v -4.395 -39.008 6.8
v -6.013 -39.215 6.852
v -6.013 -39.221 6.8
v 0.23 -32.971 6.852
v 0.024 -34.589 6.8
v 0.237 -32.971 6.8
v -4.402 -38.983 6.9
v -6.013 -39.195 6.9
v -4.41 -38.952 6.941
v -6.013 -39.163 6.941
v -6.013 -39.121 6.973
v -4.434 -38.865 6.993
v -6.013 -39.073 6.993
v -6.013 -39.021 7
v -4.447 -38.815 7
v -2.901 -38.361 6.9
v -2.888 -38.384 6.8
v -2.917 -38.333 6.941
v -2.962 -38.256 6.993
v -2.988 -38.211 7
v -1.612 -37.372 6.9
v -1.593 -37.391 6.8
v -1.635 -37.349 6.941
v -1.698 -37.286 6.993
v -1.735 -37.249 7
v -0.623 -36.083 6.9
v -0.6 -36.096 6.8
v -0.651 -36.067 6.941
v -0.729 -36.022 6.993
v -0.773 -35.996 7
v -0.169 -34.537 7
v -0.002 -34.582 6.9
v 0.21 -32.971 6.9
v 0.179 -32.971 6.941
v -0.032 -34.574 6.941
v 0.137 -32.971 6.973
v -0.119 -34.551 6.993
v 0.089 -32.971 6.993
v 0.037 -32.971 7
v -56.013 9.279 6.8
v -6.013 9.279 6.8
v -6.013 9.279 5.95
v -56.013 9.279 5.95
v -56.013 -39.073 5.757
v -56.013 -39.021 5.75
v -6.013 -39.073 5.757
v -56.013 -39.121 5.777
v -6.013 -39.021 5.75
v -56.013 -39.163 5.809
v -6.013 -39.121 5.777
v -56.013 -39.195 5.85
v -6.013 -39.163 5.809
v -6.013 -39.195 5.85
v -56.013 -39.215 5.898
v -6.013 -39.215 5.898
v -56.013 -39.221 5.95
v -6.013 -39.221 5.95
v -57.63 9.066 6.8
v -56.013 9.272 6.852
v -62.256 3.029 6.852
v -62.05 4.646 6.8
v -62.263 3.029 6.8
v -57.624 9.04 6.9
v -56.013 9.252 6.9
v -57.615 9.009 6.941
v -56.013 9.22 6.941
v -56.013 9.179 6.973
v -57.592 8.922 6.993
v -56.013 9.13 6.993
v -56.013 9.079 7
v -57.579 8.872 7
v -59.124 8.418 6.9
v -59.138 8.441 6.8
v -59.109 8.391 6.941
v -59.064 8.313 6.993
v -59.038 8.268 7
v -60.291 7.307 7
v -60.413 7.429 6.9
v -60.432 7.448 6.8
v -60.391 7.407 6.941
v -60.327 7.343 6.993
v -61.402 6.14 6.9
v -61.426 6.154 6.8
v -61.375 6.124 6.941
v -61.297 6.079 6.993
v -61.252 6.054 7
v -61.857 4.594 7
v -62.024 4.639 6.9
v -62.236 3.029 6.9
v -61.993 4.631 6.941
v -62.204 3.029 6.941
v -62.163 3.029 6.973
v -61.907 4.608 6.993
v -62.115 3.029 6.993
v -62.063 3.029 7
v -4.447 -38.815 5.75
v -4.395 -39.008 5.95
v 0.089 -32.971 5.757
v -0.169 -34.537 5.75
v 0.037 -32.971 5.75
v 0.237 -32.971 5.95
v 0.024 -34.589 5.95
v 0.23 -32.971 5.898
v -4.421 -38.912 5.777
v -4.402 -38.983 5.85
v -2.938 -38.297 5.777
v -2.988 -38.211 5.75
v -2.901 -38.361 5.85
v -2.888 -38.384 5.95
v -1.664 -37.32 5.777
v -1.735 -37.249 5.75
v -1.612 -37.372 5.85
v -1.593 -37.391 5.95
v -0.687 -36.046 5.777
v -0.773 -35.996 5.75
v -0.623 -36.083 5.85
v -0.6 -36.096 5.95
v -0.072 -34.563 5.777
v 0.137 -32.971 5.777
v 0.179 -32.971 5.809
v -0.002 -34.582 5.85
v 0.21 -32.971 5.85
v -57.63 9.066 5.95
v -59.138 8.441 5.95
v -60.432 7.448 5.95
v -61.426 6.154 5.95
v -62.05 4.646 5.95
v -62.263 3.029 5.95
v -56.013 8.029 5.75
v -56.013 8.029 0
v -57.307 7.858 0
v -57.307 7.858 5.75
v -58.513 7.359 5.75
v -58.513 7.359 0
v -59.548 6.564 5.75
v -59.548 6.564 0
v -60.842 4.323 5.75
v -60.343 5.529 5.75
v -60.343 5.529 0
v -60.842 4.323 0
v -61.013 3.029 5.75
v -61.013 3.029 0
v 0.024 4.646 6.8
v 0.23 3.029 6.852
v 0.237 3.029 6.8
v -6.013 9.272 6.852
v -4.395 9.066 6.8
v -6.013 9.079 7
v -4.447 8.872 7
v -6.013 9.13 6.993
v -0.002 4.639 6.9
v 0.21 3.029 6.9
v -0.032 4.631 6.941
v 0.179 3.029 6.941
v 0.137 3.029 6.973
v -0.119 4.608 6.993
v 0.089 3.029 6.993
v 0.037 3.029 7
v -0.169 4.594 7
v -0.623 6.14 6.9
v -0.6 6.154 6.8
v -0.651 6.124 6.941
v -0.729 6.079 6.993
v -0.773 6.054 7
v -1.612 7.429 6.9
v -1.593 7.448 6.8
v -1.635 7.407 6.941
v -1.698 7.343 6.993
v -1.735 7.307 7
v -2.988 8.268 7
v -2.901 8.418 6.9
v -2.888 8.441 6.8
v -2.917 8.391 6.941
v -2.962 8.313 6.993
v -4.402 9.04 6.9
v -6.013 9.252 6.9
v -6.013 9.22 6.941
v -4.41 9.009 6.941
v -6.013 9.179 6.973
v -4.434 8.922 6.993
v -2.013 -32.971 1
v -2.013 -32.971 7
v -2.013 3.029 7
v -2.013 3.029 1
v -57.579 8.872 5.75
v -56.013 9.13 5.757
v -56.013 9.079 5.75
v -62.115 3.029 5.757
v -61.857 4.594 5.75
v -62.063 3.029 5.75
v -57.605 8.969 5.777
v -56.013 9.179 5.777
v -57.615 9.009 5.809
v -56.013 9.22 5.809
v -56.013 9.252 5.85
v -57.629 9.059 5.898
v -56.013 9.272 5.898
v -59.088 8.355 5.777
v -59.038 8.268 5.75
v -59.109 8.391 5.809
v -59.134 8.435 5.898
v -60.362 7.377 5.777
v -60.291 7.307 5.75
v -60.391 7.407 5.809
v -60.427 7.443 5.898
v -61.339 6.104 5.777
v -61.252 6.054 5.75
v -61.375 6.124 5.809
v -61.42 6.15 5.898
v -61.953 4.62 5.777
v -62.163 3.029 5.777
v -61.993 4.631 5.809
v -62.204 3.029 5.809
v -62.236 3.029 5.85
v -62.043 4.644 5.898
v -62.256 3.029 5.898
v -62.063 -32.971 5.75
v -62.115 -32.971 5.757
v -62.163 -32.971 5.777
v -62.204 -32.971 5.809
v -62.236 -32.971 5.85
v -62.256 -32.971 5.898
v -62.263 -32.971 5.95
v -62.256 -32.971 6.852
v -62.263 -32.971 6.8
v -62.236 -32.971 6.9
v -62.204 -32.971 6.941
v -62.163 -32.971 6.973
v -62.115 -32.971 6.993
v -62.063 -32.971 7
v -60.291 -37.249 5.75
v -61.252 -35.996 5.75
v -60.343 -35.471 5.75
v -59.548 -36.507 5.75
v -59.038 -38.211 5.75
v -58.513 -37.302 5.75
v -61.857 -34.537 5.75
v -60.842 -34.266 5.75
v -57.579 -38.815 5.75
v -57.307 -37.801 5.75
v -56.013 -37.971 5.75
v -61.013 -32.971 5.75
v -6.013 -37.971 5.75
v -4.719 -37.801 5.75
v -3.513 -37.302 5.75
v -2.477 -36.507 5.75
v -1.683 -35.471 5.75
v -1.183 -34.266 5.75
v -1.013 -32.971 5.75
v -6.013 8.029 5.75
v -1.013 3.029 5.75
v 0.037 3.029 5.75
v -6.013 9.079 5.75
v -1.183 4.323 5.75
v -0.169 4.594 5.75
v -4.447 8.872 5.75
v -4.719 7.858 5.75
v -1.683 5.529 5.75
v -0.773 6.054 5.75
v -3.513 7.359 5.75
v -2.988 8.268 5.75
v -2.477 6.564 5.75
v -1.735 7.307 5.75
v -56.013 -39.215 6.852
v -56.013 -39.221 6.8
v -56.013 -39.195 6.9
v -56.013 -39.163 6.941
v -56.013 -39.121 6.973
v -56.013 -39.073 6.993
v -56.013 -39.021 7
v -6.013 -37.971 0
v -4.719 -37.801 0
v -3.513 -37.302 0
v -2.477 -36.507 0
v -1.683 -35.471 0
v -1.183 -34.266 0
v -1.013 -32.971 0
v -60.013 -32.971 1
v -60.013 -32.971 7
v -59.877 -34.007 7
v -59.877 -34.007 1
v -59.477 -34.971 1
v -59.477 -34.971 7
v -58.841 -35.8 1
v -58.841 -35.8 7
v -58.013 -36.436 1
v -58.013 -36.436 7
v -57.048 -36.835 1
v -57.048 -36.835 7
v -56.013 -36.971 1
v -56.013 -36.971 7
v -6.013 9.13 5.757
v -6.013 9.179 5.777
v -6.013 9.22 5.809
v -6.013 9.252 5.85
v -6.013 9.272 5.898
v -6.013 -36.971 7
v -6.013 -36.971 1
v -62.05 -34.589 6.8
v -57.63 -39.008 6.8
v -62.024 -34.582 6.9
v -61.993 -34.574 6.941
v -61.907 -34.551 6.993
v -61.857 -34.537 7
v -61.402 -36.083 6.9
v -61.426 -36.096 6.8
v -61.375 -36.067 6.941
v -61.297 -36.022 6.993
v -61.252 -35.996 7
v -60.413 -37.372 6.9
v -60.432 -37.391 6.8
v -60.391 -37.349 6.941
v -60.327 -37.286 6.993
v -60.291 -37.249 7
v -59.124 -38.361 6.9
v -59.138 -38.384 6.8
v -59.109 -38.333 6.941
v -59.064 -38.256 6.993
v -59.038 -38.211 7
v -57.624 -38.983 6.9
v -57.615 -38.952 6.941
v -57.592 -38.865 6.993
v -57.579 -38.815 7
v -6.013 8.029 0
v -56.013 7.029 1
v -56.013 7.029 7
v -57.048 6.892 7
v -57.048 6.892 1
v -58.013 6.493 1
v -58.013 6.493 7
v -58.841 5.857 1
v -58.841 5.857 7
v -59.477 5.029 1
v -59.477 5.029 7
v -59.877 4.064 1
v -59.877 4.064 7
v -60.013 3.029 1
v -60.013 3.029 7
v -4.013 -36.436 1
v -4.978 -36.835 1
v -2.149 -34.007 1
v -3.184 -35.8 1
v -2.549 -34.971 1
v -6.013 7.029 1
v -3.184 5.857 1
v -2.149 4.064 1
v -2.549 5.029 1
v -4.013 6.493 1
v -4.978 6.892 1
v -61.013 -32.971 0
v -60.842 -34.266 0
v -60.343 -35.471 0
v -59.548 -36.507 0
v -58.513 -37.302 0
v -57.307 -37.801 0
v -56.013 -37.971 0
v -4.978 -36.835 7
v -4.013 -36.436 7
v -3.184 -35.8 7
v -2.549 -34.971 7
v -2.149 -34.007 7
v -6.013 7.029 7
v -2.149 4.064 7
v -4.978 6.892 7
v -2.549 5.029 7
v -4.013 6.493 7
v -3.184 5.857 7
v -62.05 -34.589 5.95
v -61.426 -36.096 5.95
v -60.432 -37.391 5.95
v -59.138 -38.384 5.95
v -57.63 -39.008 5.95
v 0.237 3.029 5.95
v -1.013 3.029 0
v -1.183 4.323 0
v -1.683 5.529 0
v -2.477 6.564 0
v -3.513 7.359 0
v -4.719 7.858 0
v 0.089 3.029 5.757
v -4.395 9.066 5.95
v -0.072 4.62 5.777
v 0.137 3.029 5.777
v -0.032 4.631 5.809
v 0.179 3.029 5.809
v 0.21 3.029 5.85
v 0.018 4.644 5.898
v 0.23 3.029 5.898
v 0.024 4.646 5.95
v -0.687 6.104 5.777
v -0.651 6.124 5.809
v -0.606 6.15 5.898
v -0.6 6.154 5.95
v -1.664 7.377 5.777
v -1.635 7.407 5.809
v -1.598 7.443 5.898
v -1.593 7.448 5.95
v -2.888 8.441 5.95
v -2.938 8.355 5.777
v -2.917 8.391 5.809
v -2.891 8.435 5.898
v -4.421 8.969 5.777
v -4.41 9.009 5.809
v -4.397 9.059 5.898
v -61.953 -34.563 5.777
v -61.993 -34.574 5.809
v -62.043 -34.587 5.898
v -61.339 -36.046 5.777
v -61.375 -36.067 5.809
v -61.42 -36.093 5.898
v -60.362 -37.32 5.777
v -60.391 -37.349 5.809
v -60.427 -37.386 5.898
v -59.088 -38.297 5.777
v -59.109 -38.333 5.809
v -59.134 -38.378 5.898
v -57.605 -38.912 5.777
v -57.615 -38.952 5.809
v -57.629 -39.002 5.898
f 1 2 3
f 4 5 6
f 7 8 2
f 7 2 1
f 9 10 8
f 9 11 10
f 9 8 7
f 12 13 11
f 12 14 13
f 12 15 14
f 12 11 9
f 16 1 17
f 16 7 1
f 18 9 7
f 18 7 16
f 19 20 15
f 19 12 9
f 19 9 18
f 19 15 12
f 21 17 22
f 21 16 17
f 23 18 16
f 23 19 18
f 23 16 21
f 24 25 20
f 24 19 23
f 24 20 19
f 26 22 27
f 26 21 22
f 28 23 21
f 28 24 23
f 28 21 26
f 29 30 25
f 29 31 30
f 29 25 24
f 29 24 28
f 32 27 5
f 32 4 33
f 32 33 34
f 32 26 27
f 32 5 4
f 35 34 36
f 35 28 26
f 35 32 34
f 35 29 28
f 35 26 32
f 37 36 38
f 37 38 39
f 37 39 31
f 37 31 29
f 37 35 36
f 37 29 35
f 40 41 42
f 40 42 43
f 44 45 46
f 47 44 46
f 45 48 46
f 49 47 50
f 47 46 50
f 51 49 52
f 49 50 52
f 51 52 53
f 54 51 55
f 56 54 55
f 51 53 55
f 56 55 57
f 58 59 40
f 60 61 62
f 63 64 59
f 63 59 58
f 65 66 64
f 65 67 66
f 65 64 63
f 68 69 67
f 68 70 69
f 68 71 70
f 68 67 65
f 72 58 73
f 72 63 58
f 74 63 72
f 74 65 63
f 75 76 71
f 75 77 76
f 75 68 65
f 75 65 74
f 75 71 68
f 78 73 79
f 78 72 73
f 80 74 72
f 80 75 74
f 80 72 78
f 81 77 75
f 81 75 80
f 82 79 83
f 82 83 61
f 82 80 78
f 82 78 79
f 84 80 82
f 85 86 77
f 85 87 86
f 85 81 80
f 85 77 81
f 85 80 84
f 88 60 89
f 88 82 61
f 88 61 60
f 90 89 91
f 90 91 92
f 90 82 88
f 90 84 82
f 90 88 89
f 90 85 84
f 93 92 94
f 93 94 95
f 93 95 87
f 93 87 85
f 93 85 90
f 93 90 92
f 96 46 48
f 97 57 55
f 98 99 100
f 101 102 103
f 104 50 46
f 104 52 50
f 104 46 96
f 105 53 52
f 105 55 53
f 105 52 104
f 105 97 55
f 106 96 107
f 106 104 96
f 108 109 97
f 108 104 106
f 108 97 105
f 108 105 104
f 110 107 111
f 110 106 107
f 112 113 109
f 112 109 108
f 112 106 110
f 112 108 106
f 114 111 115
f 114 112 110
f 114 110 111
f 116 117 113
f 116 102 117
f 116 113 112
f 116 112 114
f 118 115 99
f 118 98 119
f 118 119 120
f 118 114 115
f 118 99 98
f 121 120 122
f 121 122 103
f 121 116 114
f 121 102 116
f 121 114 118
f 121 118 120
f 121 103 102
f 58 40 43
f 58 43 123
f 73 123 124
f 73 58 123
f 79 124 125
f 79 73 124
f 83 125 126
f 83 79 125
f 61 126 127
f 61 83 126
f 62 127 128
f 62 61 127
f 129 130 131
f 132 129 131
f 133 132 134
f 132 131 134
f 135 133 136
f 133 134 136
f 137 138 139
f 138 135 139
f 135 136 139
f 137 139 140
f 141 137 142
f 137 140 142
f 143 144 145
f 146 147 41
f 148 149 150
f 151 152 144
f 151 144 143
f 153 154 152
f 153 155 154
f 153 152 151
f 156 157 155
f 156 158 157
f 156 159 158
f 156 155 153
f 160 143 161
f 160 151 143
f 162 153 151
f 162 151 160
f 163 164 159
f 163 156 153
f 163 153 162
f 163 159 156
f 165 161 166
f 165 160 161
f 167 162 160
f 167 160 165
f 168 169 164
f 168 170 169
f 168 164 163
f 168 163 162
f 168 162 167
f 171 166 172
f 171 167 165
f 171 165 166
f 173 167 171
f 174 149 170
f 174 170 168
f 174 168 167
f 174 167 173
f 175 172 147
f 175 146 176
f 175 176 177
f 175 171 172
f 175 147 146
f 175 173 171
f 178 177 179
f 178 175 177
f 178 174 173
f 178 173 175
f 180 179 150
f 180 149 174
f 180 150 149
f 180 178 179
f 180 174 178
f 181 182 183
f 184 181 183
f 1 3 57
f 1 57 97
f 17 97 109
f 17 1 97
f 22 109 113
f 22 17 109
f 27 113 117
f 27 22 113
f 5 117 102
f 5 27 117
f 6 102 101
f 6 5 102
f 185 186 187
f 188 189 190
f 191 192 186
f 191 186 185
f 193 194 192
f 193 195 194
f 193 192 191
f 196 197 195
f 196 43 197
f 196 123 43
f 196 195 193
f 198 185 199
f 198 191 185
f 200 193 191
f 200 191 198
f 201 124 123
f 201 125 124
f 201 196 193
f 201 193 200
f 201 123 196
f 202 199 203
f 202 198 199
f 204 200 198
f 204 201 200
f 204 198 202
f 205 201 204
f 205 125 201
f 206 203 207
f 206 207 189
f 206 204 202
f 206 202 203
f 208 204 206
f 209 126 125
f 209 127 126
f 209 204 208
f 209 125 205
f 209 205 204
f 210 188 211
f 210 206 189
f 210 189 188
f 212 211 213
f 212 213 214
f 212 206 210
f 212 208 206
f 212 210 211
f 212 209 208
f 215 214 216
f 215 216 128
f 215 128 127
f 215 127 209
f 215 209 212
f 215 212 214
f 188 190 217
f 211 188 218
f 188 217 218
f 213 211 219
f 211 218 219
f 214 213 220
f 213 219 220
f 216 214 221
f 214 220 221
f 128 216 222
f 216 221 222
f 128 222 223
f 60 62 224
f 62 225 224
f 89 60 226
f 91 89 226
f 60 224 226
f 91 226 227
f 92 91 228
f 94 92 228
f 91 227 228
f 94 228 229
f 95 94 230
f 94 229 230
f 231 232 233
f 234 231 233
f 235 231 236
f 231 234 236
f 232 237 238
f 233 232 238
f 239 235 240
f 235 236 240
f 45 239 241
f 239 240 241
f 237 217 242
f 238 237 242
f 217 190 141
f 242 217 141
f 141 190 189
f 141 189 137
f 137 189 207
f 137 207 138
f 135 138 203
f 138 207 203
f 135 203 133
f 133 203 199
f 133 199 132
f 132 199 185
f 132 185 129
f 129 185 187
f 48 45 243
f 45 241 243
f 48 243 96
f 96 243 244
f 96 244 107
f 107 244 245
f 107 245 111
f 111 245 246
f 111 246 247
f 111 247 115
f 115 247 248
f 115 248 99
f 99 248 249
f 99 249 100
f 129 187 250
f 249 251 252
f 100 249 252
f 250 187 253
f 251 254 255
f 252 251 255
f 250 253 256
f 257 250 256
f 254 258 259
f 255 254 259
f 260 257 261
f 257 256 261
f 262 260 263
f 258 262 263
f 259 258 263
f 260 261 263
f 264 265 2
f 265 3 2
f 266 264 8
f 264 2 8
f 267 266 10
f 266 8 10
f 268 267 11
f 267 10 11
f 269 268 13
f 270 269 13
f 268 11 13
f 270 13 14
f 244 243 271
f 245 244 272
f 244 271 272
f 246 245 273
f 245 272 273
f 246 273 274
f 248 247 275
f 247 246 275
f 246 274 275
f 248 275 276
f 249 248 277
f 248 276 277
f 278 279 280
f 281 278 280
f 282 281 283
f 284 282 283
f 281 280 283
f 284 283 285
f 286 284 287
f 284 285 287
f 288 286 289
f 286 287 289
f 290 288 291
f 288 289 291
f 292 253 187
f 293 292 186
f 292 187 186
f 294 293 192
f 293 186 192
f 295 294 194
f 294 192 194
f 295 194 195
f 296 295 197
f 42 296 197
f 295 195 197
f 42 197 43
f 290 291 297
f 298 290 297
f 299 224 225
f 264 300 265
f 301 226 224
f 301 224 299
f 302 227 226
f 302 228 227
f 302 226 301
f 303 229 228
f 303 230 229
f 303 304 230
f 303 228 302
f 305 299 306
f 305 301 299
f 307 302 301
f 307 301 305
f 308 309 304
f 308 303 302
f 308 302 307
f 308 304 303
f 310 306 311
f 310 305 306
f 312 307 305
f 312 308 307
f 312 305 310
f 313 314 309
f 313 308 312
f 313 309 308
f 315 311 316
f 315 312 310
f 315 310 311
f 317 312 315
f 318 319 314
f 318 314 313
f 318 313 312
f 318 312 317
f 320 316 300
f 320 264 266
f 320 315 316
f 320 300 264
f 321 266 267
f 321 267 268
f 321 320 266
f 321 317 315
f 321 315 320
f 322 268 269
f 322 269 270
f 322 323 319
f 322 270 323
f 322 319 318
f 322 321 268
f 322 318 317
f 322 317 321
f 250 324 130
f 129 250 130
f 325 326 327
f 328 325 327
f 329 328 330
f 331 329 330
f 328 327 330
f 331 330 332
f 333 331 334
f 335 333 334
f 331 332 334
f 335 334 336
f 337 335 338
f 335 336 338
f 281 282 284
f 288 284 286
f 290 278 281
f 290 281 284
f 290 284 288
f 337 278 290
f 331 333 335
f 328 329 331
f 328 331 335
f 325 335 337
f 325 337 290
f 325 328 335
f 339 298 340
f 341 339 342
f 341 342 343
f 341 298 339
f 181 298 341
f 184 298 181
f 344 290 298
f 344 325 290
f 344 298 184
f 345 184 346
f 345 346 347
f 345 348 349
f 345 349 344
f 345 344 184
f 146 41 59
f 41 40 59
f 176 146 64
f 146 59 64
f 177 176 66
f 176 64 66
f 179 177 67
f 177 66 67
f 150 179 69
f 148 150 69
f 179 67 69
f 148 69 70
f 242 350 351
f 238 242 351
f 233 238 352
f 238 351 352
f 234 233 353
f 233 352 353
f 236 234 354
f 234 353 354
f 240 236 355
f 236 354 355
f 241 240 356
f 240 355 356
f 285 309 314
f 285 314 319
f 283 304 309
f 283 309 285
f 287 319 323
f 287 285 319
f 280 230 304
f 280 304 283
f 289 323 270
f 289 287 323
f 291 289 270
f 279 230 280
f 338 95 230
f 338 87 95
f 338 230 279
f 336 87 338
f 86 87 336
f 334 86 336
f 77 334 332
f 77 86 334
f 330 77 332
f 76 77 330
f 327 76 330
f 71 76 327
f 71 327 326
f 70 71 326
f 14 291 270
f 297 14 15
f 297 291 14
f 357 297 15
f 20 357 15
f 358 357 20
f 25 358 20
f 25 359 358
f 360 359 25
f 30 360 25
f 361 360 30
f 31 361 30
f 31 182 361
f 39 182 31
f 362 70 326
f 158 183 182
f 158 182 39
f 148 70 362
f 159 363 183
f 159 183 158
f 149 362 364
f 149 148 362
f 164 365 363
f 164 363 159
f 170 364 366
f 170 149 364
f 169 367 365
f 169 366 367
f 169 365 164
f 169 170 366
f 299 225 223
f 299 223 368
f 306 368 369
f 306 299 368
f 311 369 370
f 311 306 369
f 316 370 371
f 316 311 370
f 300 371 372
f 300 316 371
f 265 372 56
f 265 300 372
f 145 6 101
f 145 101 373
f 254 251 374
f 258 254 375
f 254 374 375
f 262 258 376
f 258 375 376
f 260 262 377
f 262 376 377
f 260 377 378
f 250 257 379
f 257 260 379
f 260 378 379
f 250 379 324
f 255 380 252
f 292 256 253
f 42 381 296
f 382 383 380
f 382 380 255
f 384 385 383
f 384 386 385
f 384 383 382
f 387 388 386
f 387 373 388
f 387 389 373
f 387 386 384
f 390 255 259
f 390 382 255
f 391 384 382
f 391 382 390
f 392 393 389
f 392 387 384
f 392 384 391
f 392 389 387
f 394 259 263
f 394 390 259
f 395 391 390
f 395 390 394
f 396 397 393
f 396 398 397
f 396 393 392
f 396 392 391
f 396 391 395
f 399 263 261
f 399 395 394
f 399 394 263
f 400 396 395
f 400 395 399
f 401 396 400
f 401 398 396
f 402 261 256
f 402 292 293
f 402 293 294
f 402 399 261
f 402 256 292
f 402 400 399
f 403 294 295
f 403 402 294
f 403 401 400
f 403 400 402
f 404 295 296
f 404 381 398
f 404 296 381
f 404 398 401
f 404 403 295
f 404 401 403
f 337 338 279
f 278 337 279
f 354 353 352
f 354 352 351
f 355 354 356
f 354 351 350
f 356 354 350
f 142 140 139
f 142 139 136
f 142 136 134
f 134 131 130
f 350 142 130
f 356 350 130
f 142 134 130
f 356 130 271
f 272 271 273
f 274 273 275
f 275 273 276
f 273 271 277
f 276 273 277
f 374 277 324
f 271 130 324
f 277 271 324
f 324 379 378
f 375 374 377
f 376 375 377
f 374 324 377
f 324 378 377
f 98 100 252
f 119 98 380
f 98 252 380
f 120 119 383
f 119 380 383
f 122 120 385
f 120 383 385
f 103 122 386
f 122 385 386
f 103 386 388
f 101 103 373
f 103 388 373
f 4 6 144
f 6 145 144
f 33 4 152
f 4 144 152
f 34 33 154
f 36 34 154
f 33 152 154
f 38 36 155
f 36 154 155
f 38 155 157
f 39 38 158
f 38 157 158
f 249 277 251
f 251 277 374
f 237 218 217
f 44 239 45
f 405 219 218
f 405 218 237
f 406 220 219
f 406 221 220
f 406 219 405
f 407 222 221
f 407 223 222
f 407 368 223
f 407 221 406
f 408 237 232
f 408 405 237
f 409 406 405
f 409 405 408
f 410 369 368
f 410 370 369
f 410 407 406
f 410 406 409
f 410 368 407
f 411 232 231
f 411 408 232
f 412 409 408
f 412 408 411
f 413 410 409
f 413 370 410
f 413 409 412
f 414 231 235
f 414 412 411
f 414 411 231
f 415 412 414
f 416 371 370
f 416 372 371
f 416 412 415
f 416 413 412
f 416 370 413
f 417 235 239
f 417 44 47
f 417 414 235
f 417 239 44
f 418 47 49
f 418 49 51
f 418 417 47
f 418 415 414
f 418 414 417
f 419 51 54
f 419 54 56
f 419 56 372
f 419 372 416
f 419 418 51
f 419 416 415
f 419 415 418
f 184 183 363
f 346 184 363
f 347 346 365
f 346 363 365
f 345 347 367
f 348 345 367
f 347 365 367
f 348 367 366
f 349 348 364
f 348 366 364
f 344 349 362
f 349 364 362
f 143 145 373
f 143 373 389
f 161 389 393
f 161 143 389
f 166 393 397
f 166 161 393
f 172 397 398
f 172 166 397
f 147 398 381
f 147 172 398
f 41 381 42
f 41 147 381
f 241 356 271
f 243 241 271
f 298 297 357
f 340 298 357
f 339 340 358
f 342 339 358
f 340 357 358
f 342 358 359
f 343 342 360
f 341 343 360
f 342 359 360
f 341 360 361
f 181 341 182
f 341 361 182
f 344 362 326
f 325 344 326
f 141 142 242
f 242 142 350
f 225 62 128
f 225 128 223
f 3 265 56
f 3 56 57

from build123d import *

# Parameters (mm, degrees)
F1_DEPTH      = 7
F3_DEPTH      = 1.25
F5_DEPTH      = 6
F5_DEPTH_BACK = 25
F6_R          = 0.2


with BuildPart() as f1:
    # F0 (on Top) → F1 (new body)
    with BuildSketch(Plane.XY):
        with BuildLine():
            Line((-6.0128417611, 8.0285779238), (-56.0128417611, 8.0285779238))
            ThreePointArc((-56.0128417611, 8.0285779238), (-59.548375667, 6.5641118297), (-61.0128417611, 3.0285779238))
            Line((-61.0128417611, 3.0285779238), (-61.0128417611, -32.9714220762))
            ThreePointArc((-61.0128417611, -32.9714220762), (-59.548375667, -36.5069559822), (-56.0128417611, -37.9714220762))
            Line((-56.0128417611, -37.9714220762), (-6.0128417611, -37.9714220762))
            ThreePointArc((-6.0128417611, -37.9714220762), (-2.4773078552, -36.5069559822), (-1.0128417611, -32.9714220762))
            Line((-1.0128417611, -32.9714220762), (-1.0128417611, 3.0285779238))
            ThreePointArc((-1.0128417611, 3.0285779238), (-2.4773078552, 6.5641118297), (-6.0128417611, 8.0285779238))
        make_face()
    extrude(amount=F1_DEPTH)

    # F2 (on face) → F3 (join)
    with BuildSketch(Plane.XY.offset(7)):
        with BuildLine():
            ThreePointArc((-56.0128417611, 9.2785779238), (-60.4322591435, 7.4479953062), (-62.2628417611, 3.0285779238))
            Line((-62.2628417611, 3.0285779238), (-62.2628417611, -32.9714220762))
            ThreePointArc((-62.2628417611, -32.9714220762), (-60.4322591435, -37.3908394586), (-56.0128417611, -39.2214220762))
            Line((-56.0128417611, -39.2214220762), (-6.0128417611, -39.2214220762))
            ThreePointArc((-6.0128417611, -39.2214220762), (-1.5934243787, -37.3908394586), (0.2371582389, -32.9714220762))
            Line((0.2371582389, -32.9714220762), (0.2371582389, 3.0285779238))
            ThreePointArc((0.2371582389, 3.0285779238), (-1.5934243787, 7.4479953062), (-6.0128417611, 9.2785779238))
            Line((-6.0128417611, 9.2785779238), (-56.0128417611, 9.2785779238))
        make_face()
    extrude(amount=-F3_DEPTH)

    # F4 (on face) → F5 (cut, two sides)
    with BuildSketch(Plane.XY.offset(7)) as f5_sk:
        with BuildLine():
            ThreePointArc((-56.0128417611, 7.0285779238), (-58.8412688859, 5.8570050485), (-60.0128417611, 3.0285779238))
            Line((-60.0128417611, 3.0285779238), (-60.0128417611, -32.9714220762))
            ThreePointArc((-60.0128417611, -32.9714220762), (-58.8412688859, -35.799849201), (-56.0128417611, -36.9714220762))
            Line((-56.0128417611, -36.9714220762), (-6.0128417611, -36.9714220762))
            ThreePointArc((-6.0128417611, -36.9714220762), (-3.1844146364, -35.799849201), (-2.0128417611, -32.9714220762))
            Line((-2.0128417611, -32.9714220762), (-2.0128417611, 3.0285779238))
            ThreePointArc((-2.0128417611, 3.0285779238), (-3.1844146364, 5.8570050485), (-6.0128417611, 7.0285779238))
            Line((-6.0128417611, 7.0285779238), (-56.0128417611, 7.0285779238))
        make_face()
    extrude(amount=-F5_DEPTH, mode=Mode.SUBTRACT)
    extrude(f5_sk.sketch, amount=F5_DEPTH_BACK, mode=Mode.SUBTRACT)

    # F6
    f6_edges = [f1.edges().sort_by_distance(p)[0] for p in [
        (-62.262842, -14.971422, 7),
        (-60.432259, -37.390839, 7),
        (-31.012842, -39.221422, 7),
        (-1.593424, -37.390839, 7),
        (0.237158, -14.971422, 7),
        (-1.593424, 7.447995, 7),
        (-31.012842, 9.278578, 7),
        (-60.432259, 7.447995, 7),
        (-1.593424, -37.390839, 5.75),
    ]]
    fillet(f6_edges, radius=F6_R)


solid = f1.part
